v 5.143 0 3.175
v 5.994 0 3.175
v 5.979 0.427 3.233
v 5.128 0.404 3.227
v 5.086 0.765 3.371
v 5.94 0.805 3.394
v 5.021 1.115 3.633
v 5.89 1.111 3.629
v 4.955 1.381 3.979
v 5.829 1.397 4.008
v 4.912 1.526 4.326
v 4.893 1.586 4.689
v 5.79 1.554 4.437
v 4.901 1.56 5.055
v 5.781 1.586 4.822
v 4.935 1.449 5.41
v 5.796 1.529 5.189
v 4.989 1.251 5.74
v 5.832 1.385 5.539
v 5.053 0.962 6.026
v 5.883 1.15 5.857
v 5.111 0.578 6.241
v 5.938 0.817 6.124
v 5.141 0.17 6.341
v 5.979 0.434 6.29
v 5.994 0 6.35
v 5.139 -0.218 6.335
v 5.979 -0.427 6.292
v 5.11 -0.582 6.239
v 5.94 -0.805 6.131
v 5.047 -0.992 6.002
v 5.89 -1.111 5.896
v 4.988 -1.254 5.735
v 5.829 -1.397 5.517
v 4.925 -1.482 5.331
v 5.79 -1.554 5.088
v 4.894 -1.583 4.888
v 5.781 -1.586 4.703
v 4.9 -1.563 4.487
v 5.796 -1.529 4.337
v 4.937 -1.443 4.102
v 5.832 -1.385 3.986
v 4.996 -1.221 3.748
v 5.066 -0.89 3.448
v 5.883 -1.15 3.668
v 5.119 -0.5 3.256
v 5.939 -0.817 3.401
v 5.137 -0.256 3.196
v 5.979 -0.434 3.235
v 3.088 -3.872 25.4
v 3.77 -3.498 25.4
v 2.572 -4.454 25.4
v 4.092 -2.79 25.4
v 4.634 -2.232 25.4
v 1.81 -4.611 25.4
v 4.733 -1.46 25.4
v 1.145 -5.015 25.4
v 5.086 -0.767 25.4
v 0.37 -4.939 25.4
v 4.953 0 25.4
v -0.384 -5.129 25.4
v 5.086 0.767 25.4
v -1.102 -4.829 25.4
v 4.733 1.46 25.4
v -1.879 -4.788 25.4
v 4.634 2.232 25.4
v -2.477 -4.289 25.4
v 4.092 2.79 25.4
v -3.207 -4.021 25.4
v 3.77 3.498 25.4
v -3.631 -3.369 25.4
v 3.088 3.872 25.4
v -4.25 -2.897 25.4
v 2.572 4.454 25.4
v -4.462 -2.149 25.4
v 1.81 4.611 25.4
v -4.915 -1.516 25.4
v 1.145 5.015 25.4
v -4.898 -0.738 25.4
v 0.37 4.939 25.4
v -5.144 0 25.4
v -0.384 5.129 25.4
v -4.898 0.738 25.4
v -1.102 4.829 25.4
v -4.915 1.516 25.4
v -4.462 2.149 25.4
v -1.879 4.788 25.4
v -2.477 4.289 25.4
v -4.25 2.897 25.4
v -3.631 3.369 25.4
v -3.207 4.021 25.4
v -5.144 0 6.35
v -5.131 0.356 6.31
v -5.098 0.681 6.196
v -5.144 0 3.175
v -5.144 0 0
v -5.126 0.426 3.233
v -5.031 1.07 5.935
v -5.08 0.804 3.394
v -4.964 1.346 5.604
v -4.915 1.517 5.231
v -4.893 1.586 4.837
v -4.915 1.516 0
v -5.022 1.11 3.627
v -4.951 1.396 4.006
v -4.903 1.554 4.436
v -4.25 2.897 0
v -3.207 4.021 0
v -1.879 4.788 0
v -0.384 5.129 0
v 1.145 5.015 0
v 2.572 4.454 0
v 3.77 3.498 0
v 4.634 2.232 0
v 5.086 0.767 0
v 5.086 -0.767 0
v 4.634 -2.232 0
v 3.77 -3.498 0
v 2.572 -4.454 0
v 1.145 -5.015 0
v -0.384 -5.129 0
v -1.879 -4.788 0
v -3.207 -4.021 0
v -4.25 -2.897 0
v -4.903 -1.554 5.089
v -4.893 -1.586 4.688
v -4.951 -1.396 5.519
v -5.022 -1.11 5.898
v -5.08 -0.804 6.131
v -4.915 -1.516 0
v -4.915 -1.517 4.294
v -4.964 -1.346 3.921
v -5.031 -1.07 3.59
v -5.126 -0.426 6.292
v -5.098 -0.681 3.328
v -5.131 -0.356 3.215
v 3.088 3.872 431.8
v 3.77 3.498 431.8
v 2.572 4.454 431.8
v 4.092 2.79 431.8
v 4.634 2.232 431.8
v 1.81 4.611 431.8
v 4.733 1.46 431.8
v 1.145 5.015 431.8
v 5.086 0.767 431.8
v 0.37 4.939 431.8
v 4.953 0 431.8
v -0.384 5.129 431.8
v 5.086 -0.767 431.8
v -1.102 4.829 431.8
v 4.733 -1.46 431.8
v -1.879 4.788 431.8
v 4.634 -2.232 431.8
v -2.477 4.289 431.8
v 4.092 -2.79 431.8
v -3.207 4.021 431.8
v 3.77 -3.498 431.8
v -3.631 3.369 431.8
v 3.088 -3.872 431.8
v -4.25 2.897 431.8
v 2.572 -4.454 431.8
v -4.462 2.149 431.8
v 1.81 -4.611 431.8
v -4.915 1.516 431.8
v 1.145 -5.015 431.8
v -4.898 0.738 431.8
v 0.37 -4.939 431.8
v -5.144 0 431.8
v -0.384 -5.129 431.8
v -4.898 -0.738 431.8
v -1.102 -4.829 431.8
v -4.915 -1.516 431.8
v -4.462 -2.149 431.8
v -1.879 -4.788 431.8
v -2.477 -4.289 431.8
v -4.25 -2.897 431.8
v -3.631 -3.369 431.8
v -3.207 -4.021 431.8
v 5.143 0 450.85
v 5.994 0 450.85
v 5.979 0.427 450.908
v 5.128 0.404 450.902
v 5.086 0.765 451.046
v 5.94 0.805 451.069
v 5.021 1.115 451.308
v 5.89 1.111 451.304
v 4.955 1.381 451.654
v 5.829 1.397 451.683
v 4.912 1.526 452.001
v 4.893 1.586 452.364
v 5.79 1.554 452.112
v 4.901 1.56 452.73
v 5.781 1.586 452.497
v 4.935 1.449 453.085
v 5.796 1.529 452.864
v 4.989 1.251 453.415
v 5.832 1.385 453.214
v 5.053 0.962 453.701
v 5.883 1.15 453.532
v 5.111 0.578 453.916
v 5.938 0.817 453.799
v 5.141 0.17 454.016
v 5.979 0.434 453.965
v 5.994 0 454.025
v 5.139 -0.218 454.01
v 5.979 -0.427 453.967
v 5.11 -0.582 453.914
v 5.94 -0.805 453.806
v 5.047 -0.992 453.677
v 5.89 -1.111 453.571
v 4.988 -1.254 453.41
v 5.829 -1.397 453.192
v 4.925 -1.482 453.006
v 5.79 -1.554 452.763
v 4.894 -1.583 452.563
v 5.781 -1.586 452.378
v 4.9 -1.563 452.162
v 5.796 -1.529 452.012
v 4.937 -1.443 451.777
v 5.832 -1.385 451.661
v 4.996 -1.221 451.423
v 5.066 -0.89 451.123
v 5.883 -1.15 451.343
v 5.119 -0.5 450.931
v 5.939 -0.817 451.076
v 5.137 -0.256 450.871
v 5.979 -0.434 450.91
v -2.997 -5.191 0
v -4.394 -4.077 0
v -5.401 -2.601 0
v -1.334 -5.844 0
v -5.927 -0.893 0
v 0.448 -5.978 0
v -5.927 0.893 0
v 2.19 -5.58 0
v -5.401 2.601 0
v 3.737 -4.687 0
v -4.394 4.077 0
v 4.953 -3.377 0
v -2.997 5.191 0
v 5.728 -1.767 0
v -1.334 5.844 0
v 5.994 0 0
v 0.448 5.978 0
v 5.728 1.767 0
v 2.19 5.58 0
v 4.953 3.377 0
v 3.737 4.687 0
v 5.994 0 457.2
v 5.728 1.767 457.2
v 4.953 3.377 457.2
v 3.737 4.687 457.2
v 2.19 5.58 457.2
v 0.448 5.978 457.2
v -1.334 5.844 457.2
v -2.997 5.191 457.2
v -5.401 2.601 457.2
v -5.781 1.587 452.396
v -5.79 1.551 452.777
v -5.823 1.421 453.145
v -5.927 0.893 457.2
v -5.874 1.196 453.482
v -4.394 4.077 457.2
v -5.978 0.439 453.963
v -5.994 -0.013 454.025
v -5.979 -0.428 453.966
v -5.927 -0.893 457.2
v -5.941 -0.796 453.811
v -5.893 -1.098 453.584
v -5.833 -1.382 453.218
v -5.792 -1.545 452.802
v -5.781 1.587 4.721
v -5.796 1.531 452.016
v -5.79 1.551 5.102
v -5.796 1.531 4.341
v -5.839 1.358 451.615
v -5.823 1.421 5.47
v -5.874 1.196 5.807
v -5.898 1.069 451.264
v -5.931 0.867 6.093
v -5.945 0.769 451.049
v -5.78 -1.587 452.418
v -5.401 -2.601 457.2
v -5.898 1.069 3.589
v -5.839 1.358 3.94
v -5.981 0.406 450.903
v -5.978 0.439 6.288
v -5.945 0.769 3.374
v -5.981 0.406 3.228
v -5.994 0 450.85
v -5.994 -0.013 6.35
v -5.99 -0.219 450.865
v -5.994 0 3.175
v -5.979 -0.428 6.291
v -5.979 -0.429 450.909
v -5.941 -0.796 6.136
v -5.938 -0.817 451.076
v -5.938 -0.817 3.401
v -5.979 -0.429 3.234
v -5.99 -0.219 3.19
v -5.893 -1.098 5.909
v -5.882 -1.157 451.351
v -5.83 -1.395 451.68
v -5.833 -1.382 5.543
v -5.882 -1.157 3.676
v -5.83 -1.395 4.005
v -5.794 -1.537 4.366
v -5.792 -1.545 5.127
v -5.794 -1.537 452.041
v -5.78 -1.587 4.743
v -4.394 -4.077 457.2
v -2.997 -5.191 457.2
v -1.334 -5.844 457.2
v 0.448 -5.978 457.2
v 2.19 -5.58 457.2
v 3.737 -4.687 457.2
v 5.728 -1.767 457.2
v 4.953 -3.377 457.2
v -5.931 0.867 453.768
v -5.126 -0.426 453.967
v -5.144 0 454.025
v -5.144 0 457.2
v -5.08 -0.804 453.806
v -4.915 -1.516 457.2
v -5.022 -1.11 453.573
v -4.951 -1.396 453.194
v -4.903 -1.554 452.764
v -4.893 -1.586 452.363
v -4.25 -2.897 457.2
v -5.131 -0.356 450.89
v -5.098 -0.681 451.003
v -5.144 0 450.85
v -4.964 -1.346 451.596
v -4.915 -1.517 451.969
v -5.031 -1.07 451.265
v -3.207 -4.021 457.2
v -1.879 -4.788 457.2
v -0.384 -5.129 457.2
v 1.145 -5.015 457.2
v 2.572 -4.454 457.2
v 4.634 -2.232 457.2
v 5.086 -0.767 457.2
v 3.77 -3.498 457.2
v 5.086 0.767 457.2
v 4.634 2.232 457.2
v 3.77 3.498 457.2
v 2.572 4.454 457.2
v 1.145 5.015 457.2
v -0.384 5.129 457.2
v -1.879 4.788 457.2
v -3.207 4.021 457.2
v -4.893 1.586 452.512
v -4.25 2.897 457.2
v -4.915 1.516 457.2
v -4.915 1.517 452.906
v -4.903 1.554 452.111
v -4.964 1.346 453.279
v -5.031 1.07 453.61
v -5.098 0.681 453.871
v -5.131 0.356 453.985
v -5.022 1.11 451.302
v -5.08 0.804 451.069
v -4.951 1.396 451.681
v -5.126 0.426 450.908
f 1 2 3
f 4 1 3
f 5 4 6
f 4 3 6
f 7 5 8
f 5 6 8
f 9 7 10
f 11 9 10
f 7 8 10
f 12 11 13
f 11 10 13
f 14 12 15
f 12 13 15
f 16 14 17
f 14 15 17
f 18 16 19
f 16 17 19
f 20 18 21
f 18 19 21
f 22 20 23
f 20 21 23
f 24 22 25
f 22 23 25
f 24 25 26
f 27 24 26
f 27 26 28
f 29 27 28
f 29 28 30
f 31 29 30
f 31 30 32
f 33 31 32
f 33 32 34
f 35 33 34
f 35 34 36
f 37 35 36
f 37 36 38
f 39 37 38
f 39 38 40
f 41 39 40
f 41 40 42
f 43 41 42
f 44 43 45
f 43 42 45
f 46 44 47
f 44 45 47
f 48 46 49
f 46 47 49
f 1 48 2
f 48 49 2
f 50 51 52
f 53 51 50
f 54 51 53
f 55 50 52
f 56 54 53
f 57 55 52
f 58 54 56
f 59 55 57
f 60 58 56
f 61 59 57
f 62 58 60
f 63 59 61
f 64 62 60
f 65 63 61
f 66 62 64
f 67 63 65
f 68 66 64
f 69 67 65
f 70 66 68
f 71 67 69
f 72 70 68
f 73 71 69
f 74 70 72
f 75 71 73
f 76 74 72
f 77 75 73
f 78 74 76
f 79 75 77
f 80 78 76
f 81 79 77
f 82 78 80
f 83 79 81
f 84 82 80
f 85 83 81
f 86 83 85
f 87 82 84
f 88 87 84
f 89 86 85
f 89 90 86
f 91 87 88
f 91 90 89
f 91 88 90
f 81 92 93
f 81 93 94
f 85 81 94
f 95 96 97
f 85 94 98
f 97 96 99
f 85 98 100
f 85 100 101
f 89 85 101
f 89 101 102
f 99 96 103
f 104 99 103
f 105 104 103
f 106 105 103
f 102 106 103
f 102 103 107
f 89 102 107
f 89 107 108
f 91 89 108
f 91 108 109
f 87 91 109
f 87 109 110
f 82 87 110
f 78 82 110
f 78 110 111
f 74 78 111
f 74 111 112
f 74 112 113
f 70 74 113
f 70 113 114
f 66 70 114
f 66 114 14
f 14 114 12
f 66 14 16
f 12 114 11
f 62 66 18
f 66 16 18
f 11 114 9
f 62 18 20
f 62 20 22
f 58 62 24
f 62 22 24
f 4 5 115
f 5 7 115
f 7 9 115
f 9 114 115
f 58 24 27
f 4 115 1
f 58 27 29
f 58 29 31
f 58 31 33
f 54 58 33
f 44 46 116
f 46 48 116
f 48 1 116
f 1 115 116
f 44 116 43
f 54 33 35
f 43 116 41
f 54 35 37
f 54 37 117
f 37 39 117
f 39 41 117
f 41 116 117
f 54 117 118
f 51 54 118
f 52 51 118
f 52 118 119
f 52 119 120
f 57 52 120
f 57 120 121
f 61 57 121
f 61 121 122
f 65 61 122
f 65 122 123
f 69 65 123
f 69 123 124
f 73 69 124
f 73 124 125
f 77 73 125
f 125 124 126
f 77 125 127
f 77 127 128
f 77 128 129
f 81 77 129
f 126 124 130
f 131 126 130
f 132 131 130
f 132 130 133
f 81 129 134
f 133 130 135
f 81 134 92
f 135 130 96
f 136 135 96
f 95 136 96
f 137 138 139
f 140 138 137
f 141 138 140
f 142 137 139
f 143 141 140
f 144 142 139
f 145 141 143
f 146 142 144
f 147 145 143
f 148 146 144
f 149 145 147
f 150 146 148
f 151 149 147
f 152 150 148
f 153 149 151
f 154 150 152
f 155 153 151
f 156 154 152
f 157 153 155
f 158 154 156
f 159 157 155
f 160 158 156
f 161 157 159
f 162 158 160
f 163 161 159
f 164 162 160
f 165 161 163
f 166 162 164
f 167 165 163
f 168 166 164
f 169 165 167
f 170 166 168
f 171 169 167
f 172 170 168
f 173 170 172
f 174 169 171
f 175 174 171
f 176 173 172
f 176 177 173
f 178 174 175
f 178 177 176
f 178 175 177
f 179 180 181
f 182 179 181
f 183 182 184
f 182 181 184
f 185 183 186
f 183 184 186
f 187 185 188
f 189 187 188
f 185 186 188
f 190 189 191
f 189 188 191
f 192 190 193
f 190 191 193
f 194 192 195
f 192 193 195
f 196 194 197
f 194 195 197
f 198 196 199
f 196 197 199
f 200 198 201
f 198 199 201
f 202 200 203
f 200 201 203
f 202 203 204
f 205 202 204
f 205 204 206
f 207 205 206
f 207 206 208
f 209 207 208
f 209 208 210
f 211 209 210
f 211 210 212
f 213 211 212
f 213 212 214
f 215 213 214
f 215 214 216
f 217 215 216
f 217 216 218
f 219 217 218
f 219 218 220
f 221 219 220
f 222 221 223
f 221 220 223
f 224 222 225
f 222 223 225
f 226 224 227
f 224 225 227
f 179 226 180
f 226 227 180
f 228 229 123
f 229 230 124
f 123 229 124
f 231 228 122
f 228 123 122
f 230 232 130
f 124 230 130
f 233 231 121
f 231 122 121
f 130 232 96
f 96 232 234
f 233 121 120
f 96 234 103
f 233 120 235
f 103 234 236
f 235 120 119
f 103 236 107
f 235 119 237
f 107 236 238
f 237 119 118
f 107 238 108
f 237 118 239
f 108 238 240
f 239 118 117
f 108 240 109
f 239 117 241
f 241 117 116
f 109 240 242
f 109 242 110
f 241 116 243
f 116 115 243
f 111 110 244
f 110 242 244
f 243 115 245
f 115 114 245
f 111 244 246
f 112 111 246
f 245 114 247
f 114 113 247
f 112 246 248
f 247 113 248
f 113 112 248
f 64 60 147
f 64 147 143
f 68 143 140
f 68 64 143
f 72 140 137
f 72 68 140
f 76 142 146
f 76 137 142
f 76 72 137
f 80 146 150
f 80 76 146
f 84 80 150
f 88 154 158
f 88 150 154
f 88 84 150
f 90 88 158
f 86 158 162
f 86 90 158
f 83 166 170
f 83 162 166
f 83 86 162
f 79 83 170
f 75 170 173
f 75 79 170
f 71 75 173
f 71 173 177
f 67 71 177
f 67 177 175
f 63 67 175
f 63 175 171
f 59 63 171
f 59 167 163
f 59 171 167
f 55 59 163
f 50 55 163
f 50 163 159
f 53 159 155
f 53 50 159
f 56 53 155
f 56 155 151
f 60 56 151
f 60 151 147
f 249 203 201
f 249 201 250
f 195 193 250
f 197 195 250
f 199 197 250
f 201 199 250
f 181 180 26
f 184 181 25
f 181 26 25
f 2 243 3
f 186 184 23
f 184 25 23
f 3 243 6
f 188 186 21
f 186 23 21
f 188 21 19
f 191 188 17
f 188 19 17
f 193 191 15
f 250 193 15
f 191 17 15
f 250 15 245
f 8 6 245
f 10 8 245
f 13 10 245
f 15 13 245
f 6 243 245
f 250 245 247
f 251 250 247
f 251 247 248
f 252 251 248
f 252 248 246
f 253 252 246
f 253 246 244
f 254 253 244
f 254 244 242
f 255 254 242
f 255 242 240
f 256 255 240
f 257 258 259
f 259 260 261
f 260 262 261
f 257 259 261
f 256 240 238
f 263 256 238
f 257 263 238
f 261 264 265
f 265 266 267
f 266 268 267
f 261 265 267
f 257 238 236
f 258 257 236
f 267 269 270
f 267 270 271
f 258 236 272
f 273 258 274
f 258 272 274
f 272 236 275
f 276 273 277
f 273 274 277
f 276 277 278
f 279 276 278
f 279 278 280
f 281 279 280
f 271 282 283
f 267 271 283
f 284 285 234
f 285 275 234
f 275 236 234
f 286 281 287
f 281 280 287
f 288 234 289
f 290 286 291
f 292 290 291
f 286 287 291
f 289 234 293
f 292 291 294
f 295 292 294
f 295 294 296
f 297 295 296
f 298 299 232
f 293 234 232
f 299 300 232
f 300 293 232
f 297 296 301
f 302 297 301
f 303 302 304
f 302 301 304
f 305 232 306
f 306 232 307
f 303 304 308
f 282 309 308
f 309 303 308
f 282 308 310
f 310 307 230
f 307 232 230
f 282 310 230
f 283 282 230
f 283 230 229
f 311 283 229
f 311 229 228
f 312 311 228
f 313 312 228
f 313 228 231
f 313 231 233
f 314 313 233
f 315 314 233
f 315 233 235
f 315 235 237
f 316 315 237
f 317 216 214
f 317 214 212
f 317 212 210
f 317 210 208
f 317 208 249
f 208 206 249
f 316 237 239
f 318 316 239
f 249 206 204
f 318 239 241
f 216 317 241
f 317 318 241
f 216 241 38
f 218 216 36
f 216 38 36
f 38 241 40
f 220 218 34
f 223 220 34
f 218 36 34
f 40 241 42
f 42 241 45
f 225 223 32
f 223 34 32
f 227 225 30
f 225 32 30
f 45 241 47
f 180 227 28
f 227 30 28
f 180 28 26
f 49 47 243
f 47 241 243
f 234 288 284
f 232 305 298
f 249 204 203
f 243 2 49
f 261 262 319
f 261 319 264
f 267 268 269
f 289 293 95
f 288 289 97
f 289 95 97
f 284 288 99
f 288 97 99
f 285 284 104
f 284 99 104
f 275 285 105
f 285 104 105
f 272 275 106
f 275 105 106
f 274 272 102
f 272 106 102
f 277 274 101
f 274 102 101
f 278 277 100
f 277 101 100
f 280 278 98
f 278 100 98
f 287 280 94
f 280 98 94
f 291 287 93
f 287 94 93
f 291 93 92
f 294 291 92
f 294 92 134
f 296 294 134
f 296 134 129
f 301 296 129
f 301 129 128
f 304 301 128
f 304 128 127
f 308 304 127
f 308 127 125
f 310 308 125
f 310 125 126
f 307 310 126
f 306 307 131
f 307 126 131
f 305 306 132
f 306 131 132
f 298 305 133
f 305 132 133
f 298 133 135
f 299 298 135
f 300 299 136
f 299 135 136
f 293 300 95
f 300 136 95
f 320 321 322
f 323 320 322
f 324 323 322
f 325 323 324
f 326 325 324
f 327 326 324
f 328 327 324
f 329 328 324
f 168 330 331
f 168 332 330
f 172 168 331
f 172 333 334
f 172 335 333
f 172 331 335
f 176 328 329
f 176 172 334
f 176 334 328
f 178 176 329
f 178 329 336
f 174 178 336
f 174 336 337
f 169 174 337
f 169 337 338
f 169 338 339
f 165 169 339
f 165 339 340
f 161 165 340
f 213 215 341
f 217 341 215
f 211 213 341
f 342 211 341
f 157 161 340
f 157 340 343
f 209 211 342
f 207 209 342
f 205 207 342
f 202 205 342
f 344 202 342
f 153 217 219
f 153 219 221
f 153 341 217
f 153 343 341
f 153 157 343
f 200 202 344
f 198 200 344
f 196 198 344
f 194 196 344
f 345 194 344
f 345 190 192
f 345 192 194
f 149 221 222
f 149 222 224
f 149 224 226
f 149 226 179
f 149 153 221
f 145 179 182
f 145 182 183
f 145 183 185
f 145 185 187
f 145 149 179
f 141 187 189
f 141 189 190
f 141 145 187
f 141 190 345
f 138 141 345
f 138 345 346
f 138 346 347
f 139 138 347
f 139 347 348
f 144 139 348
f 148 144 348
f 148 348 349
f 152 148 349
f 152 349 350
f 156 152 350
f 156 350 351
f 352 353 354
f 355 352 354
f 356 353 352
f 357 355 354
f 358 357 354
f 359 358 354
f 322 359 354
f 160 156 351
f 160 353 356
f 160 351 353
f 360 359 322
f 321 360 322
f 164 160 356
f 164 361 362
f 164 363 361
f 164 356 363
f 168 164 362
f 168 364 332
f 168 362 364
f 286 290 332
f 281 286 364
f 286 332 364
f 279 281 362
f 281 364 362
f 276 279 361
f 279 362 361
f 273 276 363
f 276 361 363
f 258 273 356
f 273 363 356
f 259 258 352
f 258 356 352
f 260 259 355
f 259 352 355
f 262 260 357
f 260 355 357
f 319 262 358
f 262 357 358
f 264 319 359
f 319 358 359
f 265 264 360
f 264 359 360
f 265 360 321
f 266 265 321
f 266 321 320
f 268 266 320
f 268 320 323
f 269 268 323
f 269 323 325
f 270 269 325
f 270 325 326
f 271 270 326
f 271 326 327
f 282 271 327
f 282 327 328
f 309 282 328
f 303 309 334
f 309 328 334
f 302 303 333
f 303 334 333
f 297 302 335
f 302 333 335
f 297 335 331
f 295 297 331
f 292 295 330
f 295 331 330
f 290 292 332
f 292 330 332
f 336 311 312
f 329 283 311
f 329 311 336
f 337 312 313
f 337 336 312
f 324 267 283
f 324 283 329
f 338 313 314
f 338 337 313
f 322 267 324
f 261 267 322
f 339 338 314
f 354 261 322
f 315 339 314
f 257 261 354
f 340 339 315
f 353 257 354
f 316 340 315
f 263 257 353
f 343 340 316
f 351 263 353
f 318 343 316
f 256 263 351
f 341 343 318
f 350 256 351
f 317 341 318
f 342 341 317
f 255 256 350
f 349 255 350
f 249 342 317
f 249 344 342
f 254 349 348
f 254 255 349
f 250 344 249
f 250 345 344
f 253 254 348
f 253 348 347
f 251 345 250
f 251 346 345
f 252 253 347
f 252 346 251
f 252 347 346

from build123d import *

# Parameters (mm, degrees)
SKETCH1_R                    = 5.9944
SKETCH1_R_2                  = 4.953
BOSS_EXTRUDE1_DEPTH          = 457.2
SKETCH8_R                    = 5.1435
CUT_EXTRUDE2_DEPTH           = 25.4
CUT_EXTRUDE3_START           = -25.4
SKETCH9_R                    = 5.1435
CUT_EXTRUDE3_DEPTH           = 25.4
F_1_8_0_125_DIAMETER_HOLE1_D = 3.175


with BuildPart() as part:
    # Sketch1 → Boss-Extrude1 (new body)
    with BuildSketch(Plane.XY):
        Circle(SKETCH1_R)
        Circle(SKETCH1_R_2, mode=Mode.SUBTRACT)
    extrude(amount=BOSS_EXTRUDE1_DEPTH)

    # Sketch8 → Cut-Extrude2 (cut)
    with BuildSketch(Plane(origin=(0, 0, 0), x_dir=(-1, 0, 0), z_dir=(0, 0, -1))):
        Circle(SKETCH8_R)
    extrude(amount=-CUT_EXTRUDE2_DEPTH, mode=Mode.SUBTRACT)

    # Sketch9 → Cut-Extrude3 (cut)
    with BuildSketch(Plane.XY.offset(457.2).offset(CUT_EXTRUDE3_START)):
        with Locations(Location((0, 0, 0), (0, 0, 180))):
            Circle(SKETCH9_R)
    extrude(amount=CUT_EXTRUDE3_DEPTH, mode=Mode.SUBTRACT)

    # 1/8 (0.125) Diameter Hole1 (through all)
    with Locations(Plane.ZY.offset(5.9944)):
        with Locations((452.4375, 0), (4.7625, 0)):
            Hole(F_1_8_0_125_DIAMETER_HOLE1_D / 2)


solid = part.part
